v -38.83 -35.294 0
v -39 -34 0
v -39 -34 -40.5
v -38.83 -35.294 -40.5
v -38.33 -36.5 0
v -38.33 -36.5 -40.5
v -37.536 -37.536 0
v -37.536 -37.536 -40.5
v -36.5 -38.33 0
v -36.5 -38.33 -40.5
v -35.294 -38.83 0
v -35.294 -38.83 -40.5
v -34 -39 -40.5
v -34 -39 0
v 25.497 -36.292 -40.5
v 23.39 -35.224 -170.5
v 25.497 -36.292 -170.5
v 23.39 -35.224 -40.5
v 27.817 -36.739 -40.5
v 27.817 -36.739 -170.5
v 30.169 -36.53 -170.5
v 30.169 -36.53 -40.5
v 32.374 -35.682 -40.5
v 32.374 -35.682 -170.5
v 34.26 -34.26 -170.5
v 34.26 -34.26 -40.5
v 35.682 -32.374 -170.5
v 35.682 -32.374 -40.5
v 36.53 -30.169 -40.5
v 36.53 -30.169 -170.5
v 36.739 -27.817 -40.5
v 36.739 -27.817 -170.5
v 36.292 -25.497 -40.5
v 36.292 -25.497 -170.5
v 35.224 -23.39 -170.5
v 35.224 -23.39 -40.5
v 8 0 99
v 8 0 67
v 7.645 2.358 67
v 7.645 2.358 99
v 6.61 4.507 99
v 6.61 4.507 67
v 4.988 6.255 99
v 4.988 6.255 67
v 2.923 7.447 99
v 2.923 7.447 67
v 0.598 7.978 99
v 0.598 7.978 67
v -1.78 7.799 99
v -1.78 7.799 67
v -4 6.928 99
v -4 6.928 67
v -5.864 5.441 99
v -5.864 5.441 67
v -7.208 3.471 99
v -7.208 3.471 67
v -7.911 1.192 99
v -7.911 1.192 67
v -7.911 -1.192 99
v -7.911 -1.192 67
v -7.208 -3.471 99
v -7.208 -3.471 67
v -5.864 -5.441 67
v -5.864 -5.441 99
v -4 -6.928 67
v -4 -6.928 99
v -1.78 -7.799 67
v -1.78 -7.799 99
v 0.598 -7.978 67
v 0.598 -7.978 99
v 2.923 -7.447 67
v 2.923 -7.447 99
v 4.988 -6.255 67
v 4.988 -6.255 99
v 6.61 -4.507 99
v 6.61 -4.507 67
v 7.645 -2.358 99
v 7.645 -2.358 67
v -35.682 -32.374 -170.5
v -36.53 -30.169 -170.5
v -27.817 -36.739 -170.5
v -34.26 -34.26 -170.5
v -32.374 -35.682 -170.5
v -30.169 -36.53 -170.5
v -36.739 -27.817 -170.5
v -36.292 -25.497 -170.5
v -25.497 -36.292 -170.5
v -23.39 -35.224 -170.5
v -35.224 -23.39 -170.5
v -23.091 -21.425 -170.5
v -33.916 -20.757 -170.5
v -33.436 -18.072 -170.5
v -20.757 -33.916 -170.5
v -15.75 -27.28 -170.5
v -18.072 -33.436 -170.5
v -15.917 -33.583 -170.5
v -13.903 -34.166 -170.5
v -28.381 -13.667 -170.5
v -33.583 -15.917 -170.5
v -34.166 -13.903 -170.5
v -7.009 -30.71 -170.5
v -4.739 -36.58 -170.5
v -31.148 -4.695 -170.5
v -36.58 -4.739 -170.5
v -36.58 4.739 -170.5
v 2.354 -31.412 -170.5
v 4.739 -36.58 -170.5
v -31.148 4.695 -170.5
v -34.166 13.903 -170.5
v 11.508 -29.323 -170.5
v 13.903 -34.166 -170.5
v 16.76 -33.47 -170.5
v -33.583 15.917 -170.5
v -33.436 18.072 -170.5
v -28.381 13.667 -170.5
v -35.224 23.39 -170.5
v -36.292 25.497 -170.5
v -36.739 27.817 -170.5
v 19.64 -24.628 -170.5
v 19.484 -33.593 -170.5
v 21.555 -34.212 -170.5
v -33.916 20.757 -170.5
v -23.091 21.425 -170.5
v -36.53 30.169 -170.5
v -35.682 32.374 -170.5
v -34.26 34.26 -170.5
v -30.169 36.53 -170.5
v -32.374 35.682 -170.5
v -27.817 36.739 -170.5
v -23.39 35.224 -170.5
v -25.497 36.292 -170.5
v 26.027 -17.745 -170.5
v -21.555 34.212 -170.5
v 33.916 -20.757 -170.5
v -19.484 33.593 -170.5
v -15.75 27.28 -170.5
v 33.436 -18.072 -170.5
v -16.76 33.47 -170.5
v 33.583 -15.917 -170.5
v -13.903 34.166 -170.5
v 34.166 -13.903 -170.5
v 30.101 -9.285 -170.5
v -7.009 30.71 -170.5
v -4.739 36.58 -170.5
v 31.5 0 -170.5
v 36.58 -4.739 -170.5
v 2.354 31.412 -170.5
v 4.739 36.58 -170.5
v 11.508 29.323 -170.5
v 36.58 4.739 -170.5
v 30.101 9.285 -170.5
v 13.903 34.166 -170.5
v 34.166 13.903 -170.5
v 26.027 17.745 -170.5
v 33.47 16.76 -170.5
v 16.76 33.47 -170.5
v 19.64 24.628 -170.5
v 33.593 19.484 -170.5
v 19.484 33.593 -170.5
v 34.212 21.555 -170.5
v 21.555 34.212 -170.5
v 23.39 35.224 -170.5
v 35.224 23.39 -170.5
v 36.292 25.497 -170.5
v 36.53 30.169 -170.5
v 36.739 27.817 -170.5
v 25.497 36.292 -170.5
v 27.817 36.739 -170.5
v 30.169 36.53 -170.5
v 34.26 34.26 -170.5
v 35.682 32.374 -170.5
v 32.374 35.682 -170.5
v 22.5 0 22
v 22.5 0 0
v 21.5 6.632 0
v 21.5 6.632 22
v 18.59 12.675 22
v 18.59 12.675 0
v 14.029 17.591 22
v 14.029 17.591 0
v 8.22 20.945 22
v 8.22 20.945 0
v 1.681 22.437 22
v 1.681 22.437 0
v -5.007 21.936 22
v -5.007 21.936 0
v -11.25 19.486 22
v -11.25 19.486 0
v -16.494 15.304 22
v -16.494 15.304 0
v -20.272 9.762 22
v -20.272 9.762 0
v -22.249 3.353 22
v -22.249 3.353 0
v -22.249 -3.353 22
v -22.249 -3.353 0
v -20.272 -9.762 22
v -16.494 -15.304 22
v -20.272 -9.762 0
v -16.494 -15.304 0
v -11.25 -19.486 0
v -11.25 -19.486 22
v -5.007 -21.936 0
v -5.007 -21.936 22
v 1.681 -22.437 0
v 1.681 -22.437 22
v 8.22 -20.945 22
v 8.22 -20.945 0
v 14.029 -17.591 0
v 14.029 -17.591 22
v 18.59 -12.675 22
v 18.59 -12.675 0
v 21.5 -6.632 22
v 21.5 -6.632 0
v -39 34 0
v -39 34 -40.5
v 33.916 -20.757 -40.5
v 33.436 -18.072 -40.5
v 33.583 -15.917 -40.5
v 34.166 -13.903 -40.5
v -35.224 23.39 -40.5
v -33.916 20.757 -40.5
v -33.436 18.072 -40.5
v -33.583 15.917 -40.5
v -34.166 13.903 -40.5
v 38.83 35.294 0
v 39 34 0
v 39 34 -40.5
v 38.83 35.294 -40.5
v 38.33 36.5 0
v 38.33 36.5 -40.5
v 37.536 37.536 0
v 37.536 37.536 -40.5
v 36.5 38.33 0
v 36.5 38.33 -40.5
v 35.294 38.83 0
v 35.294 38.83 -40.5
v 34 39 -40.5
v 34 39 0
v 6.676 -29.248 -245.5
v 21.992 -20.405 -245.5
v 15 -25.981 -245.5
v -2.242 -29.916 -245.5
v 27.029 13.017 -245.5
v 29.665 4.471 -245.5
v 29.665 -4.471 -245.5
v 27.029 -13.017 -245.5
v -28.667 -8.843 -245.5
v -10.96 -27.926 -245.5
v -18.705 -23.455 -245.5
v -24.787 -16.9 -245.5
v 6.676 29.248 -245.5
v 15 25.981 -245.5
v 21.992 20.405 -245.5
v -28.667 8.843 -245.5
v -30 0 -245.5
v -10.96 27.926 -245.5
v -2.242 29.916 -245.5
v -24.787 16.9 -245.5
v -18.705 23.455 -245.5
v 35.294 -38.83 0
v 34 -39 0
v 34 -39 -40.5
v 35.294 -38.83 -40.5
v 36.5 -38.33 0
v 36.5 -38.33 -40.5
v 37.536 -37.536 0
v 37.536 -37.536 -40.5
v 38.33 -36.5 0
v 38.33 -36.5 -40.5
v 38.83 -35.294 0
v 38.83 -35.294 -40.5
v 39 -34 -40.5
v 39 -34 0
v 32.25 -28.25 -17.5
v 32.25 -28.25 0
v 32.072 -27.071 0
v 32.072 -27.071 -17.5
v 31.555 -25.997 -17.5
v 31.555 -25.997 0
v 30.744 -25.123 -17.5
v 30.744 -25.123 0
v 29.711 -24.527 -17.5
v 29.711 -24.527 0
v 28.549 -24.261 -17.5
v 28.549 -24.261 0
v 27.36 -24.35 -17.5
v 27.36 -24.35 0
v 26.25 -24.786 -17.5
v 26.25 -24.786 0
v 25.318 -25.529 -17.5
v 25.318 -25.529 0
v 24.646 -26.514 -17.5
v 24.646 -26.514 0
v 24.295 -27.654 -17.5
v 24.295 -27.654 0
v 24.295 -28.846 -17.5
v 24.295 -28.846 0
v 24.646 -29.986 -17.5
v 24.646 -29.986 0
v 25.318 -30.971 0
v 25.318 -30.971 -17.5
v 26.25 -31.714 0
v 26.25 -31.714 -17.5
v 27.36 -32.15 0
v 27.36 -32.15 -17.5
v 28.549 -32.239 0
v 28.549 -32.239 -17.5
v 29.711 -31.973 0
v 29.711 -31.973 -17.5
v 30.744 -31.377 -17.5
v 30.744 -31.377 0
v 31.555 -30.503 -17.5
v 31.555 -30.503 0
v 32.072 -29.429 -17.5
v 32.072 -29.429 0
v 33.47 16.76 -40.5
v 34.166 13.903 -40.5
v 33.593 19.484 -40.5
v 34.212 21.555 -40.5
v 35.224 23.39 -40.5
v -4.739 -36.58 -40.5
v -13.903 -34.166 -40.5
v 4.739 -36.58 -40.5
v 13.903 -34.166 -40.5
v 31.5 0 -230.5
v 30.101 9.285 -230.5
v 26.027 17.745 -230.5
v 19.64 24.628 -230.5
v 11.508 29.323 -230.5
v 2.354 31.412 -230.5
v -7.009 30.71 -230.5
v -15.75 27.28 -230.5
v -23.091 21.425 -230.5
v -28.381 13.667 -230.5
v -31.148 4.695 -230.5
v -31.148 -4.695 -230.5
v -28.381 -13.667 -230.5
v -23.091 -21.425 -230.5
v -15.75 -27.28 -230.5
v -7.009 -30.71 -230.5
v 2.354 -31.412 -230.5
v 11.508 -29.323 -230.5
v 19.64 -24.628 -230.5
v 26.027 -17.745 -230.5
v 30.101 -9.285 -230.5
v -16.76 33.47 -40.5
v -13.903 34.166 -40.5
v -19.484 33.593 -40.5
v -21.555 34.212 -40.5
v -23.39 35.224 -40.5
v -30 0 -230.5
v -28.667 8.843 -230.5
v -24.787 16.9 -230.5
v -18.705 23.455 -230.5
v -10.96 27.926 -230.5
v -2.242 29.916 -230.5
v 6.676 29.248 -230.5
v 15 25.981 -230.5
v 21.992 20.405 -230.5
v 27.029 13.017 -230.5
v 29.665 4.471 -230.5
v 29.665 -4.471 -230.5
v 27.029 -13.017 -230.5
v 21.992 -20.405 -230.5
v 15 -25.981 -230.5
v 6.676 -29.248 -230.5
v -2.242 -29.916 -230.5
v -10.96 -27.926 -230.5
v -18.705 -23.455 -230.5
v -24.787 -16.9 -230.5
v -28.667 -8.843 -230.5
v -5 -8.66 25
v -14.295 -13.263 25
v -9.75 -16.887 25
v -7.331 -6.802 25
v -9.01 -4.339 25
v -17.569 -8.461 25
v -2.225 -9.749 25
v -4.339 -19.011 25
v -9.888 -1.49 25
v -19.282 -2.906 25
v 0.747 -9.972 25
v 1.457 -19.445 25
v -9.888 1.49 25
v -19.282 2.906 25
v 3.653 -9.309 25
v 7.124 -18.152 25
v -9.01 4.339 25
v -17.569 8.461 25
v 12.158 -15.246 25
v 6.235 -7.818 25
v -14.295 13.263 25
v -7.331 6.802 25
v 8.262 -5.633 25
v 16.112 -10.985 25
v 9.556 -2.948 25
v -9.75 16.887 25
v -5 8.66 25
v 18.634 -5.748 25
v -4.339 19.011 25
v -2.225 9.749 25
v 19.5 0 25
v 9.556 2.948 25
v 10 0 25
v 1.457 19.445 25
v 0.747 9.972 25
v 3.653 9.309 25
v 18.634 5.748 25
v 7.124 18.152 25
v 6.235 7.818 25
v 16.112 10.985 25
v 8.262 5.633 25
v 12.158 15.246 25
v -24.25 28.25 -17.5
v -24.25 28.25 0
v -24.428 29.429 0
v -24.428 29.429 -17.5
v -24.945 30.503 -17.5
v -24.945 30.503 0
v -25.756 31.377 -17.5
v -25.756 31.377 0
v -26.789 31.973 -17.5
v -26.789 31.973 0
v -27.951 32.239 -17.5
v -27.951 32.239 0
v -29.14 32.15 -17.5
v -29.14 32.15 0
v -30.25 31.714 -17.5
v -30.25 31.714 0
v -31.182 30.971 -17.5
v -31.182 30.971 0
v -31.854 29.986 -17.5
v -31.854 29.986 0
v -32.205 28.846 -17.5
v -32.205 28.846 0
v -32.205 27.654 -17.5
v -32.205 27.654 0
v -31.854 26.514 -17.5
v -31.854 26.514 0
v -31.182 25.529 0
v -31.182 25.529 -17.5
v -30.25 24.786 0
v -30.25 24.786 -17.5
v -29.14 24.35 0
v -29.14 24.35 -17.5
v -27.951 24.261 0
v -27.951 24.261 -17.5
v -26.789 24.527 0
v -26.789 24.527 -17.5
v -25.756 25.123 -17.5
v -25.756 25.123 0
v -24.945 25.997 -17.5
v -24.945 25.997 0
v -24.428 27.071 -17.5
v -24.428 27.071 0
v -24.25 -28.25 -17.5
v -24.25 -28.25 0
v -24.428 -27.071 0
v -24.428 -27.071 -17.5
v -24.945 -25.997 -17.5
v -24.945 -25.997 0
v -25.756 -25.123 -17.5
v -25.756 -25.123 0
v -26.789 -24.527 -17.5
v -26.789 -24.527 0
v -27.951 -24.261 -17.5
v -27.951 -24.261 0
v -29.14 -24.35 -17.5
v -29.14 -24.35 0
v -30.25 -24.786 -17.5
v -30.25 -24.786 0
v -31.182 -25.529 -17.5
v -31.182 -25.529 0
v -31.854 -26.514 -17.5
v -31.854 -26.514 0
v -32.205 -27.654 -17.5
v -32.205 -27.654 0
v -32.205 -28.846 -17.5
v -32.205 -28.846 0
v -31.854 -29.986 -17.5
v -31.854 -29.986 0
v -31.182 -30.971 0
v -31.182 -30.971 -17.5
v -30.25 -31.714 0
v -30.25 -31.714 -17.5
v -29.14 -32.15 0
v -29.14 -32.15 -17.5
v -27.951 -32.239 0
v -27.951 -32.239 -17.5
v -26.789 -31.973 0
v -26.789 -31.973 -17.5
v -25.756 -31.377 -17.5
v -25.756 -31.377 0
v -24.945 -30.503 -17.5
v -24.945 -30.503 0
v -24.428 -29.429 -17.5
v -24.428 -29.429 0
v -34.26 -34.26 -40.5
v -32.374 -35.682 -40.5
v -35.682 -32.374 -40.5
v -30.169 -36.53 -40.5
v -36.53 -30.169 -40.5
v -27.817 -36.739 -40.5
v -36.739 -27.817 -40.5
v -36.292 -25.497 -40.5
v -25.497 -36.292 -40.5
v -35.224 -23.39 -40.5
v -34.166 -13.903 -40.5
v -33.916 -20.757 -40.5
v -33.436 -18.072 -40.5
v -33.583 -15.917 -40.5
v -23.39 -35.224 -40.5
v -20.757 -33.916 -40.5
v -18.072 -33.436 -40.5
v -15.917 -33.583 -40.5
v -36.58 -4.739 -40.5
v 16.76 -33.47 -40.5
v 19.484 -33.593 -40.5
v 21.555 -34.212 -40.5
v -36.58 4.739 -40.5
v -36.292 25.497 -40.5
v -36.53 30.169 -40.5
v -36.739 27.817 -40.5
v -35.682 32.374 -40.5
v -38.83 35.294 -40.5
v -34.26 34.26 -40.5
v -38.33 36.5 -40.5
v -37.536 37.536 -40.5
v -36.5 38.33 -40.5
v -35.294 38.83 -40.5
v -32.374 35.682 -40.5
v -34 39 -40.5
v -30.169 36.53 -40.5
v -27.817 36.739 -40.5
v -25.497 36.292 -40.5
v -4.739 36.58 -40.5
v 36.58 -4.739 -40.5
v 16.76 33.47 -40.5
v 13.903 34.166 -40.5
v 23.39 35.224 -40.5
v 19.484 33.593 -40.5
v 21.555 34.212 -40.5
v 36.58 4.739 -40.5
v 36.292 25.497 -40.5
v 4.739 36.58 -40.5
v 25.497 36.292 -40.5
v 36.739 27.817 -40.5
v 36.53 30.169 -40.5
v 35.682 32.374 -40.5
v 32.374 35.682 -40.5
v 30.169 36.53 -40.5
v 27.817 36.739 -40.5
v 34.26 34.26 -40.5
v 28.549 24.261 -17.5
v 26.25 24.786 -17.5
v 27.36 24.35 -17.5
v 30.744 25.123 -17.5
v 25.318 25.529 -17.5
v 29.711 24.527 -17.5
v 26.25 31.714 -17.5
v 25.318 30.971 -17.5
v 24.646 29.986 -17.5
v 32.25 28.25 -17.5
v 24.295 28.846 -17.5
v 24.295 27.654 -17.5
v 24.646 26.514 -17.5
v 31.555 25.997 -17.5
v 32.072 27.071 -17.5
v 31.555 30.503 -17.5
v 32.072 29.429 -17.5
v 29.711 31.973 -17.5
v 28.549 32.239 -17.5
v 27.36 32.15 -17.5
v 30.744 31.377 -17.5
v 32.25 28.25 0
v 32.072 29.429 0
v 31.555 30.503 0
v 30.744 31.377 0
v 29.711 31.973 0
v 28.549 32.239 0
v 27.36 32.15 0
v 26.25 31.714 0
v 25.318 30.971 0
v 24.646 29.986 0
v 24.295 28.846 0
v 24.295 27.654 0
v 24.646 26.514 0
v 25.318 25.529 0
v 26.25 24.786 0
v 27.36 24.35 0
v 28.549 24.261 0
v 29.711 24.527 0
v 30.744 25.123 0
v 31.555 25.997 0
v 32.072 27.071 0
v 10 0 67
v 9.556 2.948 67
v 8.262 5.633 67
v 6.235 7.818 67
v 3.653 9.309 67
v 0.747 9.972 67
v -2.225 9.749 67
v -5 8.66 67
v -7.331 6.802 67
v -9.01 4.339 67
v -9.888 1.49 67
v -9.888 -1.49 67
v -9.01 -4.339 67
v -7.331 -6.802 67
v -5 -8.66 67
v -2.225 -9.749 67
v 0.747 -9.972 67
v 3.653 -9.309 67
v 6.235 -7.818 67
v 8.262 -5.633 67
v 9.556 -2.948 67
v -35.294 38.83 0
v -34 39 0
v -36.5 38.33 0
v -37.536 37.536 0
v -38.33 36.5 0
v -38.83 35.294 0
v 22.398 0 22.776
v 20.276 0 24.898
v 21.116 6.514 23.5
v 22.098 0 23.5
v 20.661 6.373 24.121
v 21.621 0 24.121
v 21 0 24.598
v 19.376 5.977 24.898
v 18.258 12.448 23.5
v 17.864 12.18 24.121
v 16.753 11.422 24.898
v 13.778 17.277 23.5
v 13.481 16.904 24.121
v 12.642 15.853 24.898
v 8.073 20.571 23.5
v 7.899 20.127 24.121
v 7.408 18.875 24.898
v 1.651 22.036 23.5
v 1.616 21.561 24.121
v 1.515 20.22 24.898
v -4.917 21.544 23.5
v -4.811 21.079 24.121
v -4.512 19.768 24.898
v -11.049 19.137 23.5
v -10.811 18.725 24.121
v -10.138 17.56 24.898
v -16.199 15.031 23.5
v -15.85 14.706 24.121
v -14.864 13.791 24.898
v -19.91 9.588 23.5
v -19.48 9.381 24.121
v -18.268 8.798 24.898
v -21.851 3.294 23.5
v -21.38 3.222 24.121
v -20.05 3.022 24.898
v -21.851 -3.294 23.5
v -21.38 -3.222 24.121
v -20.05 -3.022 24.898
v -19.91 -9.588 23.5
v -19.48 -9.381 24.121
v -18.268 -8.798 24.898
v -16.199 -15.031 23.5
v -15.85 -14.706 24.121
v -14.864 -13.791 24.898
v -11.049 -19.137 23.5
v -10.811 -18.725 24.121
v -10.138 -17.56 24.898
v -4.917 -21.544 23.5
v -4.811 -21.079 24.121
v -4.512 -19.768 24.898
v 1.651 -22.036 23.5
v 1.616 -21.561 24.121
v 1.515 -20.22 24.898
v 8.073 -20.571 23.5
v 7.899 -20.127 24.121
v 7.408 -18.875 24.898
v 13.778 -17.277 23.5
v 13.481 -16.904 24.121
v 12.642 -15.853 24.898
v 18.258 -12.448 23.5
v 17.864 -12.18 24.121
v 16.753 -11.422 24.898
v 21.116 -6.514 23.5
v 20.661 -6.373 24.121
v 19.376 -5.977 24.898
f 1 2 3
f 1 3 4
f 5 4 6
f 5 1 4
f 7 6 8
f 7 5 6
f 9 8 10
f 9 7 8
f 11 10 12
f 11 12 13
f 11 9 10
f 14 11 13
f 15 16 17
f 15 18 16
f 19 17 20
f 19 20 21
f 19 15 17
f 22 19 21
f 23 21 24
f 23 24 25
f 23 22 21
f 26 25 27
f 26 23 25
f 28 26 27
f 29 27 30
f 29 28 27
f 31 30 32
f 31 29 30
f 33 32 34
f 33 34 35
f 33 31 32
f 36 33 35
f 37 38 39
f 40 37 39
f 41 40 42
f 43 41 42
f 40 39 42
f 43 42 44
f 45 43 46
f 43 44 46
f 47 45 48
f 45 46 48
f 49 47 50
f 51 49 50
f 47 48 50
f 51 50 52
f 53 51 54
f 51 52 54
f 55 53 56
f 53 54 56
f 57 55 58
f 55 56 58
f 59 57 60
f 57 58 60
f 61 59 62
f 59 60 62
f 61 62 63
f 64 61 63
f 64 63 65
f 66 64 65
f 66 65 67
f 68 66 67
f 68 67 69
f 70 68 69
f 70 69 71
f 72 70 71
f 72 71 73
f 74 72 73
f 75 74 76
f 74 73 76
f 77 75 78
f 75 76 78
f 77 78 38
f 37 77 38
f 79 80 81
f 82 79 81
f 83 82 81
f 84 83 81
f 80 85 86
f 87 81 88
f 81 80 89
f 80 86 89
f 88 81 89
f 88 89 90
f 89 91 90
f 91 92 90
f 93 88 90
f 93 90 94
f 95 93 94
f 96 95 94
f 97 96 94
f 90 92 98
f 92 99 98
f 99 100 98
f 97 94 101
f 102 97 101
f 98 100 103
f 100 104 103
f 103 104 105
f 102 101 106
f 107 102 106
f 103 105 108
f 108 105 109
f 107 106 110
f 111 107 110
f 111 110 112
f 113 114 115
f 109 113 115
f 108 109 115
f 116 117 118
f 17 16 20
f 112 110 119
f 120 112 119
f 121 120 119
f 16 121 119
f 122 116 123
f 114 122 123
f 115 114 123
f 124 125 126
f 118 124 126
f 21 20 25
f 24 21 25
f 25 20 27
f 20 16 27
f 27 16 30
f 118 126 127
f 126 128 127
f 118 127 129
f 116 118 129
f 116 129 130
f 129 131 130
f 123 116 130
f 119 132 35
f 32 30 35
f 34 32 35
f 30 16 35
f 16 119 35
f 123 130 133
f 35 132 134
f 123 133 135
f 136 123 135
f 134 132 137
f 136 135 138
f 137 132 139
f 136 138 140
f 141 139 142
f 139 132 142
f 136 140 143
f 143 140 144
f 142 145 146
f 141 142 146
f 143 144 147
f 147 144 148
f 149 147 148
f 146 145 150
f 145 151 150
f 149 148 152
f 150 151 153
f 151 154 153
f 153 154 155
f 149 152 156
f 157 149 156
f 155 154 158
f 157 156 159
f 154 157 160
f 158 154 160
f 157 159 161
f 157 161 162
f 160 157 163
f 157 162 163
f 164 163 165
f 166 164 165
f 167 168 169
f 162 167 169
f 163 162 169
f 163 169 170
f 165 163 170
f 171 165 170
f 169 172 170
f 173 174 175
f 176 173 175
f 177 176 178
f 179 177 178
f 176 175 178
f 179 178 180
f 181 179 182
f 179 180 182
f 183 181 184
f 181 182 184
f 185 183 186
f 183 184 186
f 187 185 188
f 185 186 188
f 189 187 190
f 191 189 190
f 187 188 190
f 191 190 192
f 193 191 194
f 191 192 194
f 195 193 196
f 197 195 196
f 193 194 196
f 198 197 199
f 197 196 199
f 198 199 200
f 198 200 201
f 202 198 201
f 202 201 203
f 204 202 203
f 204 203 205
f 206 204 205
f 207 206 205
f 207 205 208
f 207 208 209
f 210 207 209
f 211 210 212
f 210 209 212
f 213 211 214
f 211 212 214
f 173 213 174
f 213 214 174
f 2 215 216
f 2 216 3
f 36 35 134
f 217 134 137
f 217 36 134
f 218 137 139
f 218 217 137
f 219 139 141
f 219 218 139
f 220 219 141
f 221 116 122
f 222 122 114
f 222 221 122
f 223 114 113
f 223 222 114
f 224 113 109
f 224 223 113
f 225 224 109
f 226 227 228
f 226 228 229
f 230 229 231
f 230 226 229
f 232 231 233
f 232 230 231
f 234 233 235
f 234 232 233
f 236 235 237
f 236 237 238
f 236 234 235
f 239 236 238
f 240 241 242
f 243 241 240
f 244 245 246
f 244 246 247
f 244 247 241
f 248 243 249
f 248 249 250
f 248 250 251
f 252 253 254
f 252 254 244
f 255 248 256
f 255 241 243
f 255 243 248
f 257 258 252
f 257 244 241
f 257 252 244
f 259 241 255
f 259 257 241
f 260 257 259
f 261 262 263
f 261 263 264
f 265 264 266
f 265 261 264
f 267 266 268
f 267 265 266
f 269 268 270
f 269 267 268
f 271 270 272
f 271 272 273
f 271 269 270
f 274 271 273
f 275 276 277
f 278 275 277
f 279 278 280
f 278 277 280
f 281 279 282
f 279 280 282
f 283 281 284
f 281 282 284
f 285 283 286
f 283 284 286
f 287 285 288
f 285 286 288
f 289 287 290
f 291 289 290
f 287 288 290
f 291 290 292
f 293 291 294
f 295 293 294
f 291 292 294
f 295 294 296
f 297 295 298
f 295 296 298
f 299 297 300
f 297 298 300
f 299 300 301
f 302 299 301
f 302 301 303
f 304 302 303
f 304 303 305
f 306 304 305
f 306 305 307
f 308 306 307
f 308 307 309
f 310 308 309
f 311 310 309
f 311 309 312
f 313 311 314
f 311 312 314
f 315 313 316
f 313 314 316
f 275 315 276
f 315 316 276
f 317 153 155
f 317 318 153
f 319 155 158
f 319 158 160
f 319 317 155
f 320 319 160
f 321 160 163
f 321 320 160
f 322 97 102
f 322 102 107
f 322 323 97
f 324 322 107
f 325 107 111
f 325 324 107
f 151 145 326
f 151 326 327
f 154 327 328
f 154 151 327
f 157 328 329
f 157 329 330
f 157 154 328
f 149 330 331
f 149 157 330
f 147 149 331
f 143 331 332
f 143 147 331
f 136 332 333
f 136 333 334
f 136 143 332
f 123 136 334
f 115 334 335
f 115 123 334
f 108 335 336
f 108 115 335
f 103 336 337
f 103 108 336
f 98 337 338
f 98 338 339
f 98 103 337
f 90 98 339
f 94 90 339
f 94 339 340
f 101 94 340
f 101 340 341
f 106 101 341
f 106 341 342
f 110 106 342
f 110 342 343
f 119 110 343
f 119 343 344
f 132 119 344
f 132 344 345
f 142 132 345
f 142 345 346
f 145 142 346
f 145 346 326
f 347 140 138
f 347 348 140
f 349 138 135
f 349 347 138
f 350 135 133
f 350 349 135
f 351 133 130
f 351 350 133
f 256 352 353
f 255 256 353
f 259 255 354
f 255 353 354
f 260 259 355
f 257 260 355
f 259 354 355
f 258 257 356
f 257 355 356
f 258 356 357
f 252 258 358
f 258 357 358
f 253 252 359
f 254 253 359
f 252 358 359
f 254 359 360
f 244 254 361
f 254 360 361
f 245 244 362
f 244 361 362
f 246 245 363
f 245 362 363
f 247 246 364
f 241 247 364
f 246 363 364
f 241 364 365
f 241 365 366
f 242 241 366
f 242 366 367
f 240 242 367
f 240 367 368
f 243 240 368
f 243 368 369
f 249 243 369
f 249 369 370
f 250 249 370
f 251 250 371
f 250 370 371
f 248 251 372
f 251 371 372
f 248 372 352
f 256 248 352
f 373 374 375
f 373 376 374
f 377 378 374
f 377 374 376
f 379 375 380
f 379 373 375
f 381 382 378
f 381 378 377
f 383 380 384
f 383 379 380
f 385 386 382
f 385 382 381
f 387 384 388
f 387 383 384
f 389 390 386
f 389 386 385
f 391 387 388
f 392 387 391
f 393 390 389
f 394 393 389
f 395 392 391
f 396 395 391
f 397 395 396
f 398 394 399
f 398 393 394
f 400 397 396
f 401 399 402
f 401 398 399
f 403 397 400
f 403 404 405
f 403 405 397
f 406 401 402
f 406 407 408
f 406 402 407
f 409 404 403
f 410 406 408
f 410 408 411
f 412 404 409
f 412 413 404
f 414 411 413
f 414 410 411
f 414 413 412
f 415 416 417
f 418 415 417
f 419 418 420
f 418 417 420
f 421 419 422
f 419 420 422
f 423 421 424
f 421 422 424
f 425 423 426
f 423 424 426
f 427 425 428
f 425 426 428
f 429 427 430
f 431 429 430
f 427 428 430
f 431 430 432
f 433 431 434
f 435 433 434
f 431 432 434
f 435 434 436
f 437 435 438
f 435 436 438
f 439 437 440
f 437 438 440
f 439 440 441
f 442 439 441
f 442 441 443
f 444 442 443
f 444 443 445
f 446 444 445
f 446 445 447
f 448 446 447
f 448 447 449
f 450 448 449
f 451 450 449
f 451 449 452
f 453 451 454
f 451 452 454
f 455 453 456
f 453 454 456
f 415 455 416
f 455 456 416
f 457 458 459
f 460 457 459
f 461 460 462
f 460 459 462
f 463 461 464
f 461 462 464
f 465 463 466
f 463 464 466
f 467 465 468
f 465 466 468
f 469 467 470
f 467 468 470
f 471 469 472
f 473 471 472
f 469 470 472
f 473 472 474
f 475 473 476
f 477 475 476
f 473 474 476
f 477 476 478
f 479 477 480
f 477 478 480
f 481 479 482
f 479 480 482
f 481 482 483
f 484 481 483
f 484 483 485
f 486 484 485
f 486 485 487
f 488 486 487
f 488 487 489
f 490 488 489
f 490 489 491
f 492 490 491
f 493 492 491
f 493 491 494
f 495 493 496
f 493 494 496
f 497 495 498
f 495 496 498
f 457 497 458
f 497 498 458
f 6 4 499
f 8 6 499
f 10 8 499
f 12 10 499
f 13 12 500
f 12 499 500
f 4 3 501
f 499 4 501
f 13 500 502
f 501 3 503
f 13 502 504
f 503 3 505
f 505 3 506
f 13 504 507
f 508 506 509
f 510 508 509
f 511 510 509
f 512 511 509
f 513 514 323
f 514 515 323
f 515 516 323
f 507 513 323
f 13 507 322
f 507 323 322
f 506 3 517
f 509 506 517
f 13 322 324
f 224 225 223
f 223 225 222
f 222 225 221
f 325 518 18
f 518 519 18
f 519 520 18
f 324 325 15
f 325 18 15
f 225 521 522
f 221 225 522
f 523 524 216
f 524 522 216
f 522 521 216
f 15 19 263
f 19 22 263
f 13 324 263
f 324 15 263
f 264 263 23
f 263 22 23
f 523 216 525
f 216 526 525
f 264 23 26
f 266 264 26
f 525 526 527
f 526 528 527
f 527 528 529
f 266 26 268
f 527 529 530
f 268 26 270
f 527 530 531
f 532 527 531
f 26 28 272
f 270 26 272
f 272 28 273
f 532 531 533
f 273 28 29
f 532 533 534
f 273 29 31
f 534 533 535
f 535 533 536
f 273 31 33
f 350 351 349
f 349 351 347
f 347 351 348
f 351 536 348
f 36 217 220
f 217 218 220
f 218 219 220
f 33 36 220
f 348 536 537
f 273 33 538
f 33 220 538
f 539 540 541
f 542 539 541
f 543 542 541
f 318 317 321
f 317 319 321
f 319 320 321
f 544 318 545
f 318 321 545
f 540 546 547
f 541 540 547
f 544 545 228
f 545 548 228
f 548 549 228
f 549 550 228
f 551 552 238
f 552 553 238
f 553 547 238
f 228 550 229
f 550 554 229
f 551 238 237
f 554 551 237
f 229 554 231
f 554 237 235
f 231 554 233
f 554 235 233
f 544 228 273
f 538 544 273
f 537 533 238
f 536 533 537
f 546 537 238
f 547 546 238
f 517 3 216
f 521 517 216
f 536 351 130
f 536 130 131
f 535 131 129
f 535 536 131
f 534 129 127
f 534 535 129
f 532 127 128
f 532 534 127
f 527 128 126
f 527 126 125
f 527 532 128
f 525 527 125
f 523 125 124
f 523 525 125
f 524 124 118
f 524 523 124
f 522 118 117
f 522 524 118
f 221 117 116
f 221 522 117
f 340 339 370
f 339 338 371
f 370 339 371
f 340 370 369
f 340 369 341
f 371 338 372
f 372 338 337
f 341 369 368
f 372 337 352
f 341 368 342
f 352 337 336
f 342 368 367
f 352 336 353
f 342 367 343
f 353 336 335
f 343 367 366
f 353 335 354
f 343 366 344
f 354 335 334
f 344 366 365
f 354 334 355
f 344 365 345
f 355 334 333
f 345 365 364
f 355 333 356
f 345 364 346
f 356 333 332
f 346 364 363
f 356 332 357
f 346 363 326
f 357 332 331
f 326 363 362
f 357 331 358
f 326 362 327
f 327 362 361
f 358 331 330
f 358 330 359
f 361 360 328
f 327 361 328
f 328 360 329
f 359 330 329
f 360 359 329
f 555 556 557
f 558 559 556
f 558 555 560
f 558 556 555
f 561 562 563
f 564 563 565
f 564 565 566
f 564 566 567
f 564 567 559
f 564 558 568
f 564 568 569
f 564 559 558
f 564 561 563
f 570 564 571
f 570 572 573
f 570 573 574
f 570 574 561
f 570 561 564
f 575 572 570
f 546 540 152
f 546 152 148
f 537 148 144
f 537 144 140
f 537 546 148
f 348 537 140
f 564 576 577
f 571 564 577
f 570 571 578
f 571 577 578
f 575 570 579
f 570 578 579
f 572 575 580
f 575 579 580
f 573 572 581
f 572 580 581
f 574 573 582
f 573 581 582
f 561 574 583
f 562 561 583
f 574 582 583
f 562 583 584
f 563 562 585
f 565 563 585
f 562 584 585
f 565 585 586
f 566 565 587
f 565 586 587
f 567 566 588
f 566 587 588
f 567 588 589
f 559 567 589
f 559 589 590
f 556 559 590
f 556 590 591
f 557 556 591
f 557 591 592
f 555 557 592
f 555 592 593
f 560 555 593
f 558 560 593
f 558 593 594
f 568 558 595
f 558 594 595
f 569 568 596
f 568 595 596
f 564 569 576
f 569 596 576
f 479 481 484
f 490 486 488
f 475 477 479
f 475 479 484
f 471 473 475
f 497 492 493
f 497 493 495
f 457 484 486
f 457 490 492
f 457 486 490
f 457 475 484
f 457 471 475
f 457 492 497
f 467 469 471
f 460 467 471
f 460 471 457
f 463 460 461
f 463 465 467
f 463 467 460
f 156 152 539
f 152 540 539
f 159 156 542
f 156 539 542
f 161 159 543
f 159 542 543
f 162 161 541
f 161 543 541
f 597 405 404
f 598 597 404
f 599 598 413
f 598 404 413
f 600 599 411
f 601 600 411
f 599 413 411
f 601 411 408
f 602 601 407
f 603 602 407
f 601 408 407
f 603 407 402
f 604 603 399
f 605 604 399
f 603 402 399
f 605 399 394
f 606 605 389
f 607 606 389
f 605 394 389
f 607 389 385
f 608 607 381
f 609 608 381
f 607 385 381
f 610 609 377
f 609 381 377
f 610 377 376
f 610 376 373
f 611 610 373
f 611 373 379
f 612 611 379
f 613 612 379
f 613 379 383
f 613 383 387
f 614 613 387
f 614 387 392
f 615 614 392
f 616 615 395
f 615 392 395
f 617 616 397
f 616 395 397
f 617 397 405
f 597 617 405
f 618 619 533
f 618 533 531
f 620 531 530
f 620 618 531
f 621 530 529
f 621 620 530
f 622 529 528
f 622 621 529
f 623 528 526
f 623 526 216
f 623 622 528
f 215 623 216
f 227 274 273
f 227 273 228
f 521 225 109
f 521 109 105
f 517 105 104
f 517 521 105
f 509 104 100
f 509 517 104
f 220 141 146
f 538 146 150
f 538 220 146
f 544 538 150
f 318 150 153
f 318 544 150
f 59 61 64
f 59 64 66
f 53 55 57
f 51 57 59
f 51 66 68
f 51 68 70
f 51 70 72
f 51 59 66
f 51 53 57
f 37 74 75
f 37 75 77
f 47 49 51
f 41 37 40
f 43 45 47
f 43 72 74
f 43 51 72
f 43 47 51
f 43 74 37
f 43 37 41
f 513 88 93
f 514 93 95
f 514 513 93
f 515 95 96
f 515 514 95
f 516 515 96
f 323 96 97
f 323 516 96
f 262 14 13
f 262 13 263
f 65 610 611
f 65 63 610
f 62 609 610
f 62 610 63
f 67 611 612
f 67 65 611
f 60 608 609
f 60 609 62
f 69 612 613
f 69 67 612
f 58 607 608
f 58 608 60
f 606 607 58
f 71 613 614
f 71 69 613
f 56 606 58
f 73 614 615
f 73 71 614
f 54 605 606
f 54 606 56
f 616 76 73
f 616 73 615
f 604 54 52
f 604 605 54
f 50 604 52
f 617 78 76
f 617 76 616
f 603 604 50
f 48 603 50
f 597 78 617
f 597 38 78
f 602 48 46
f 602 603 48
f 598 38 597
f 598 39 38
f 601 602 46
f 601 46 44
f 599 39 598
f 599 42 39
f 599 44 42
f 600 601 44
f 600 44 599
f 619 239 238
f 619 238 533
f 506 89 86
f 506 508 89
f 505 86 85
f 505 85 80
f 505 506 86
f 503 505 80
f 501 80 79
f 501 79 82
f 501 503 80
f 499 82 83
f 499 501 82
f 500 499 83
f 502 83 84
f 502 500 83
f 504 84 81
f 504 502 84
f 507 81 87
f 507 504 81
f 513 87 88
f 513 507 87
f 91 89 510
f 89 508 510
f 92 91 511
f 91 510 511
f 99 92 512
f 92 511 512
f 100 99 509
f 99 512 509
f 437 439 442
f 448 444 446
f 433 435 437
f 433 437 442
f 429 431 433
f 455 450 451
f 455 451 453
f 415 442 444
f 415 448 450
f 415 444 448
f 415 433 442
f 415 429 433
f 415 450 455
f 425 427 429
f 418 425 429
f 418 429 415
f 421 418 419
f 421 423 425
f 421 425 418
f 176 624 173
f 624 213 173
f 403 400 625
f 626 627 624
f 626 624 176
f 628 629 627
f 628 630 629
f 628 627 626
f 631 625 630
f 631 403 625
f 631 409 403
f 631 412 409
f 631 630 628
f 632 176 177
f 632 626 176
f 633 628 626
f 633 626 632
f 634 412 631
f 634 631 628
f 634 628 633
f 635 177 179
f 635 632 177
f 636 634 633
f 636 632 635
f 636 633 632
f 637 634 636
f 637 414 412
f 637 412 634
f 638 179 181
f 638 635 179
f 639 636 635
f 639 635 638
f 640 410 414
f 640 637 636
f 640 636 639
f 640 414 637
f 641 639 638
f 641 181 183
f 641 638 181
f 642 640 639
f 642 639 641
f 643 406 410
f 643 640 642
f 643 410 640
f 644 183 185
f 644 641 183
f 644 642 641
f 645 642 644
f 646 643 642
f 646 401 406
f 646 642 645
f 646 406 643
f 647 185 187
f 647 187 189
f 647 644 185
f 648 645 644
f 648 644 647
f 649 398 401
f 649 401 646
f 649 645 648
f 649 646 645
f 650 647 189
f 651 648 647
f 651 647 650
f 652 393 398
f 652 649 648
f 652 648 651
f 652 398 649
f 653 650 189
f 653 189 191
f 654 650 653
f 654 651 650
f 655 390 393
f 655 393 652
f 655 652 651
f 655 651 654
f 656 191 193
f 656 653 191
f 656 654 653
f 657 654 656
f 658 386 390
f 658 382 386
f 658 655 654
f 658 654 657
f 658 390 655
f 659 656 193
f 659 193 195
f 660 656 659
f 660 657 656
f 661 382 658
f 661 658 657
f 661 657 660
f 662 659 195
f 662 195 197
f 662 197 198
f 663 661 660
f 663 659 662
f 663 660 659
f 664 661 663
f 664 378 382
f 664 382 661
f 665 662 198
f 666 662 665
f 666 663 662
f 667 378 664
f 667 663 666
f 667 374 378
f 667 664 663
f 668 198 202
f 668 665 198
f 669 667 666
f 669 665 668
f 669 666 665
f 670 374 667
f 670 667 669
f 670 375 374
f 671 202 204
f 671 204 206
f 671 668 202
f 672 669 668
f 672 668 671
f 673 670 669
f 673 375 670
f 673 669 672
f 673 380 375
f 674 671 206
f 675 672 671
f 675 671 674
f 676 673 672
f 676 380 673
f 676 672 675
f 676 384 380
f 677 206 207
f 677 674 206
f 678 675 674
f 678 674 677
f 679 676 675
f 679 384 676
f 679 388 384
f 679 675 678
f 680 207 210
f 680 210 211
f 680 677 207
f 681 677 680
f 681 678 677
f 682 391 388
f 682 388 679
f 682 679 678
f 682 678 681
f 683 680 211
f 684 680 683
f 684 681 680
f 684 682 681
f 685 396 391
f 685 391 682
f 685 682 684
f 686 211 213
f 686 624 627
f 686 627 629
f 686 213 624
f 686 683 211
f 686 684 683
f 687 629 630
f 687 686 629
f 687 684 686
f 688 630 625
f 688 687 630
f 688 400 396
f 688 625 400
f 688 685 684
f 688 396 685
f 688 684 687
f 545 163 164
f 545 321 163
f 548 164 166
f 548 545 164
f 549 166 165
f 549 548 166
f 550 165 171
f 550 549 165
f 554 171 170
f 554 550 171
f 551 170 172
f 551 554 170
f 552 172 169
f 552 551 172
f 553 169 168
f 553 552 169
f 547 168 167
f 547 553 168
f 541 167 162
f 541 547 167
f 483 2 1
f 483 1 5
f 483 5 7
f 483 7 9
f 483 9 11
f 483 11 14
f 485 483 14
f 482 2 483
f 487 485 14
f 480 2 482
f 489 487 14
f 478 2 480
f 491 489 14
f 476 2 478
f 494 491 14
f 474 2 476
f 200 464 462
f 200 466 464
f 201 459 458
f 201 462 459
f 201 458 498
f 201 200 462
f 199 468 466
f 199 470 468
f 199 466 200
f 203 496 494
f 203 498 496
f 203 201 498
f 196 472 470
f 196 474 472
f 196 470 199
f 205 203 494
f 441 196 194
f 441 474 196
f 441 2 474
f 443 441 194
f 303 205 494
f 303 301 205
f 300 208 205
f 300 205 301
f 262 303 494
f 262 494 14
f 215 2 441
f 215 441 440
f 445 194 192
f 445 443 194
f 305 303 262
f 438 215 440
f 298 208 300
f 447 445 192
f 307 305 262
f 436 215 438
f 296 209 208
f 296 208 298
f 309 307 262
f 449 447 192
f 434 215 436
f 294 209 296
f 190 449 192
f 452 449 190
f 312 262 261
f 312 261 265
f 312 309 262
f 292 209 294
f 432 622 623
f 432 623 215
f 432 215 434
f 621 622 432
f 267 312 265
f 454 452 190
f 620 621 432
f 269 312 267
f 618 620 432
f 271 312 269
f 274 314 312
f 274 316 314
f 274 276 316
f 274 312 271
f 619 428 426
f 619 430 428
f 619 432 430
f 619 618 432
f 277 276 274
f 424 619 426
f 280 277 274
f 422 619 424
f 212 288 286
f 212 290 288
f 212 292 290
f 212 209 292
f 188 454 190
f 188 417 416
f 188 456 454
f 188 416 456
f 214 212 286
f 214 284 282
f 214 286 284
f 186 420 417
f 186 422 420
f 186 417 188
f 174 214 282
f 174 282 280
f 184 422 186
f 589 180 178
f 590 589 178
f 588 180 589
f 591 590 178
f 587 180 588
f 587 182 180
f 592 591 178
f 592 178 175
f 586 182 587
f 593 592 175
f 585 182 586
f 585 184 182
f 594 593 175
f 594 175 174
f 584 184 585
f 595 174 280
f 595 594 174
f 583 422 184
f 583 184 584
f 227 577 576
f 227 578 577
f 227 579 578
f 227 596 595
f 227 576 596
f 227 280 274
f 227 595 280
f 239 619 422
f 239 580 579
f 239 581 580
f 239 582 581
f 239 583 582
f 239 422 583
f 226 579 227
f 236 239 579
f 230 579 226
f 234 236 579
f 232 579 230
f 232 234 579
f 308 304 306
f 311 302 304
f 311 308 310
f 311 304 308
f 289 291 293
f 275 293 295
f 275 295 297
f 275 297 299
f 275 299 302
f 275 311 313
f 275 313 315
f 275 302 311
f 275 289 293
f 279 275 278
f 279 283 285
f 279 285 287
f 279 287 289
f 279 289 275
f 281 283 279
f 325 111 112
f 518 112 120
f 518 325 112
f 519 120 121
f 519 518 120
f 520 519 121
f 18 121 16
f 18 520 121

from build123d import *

# Parameters (mm, degrees)
SALIENTE_EXTRUIR1_DEPTH = 40.5
CROQUIS2_R              = 36.886156795
SALIENTE_EXTRUIR2_DEPTH = 170.5
CROQUIS3_R              = 31.5
SALIENTE_EXTRUIR3_DEPTH = 230.5
CROQUIS4_R              = 30
SALIENTE_EXTRUIR4_DEPTH = 15
CROQUIS5_R              = 8.5
SALIENTE_EXTRUIR5_DEPTH = 170.5
REDONDEO2_R             = 10
REDONDEO3_R             = 10
REDONDEO4_R             = 10
REDONDEO5_R             = 10
CROQUIS6_R              = 4
CORTAR_EXTRUIR1_DEPTH   = 17.5
CROQUIS7_R              = 22.5
SALIENTE_EXTRUIR7_DEPTH = 25
REDONDEO6_R             = 3
CROQUIS8_R              = 10
SALIENTE_EXTRUIR8_DEPTH = 42
CROQUIS9_R              = 8
SALIENTE_EXTRUIR9_DEPTH = 32


with BuildPart() as part:
    # Croquis1 → Saliente-Extruir1 (new body)
    with BuildSketch(Plane.XY):
        with BuildLine():
            Line((-34, -39), (34, -39))
            ThreePointArc((34, -39), (37.535533906, -37.535533906), (39, -34))
            Line((39, -34), (39, 34))
            ThreePointArc((39, 34), (37.535533906, 37.535533906), (34, 39))
            Line((34, 39), (-34, 39))
            ThreePointArc((-34, 39), (-37.535533906, 37.535533906), (-39, 34))
            Line((-39, 34), (-39, -34))
            ThreePointArc((-39, -34), (-37.535533906, -37.535533906), (-34, -39))
        make_face()
    extrude(amount=-SALIENTE_EXTRUIR1_DEPTH)

    # Croquis2 → Saliente-Extruir2 (add)
    with BuildSketch(Plane.XY):
        Circle(CROQUIS2_R)
    extrude(amount=-SALIENTE_EXTRUIR2_DEPTH)

    # Croquis3 → Saliente-Extruir3 (add)
    with BuildSketch(Plane.XY):
        Circle(CROQUIS3_R)
    extrude(amount=-SALIENTE_EXTRUIR3_DEPTH)

    # Croquis4 → Saliente-Extruir4 (add)
    with BuildSketch(Plane(origin=(0, 0, -230.5), x_dir=(-1, 0, 0), z_dir=(0, 0, -1))):
        Circle(CROQUIS4_R)
    extrude(amount=SALIENTE_EXTRUIR4_DEPTH)

    # Croquis5 → Saliente-Extruir5 (add)
    with BuildSketch(Plane.XY):
        with Locations((28.25, 28.25)):
            Circle(CROQUIS5_R)
        with Locations((28.25, -28.25)):
            Circle(CROQUIS5_R)
        with Locations((-28.25, -28.25)):
            Circle(CROQUIS5_R)
        with Locations((-28.25, 28.25)):
            Circle(CROQUIS5_R)
    extrude(amount=-SALIENTE_EXTRUIR5_DEPTH)

    # Redondeo2
    redondeo2_edges = [part.edges().sort_by_distance(p)[0] for p in [
        (20.168422903, 30.884029541, -105.5),
        (-20.168422903, 30.884029541, -105.5),
    ]]
    fillet(redondeo2_edges, radius=REDONDEO2_R)

    # Redondeo3
    redondeo3_edges = [part.edges().sort_by_distance(p)[0] for p in [
        (-30.884029541, -20.168422903, -105.5),
        (-30.884029541, 20.168422903, -105.5),
    ]]
    fillet(redondeo3_edges, radius=REDONDEO3_R)

    # Redondeo4
    redondeo4_edges = [part.edges().sort_by_distance(p)[0] for p in [
        (20.168422903, -30.884029541, -105.5),
        (-20.168422903, -30.884029541, -105.5),
    ]]
    fillet(redondeo4_edges, radius=REDONDEO4_R)

    # Redondeo5
    redondeo5_edges = [part.edges().sort_by_distance(p)[0] for p in [
        (30.884029541, 20.168422903, -105.5),
        (30.884029541, -20.168422903, -105.5),
    ]]
    fillet(redondeo5_edges, radius=REDONDEO5_R)

    # Croquis6 → Cortar-Extruir1 (cut)
    with BuildSketch(Plane.XY):
        with Locations((28.25, 28.25)):
            Circle(CROQUIS6_R)
        with Locations((-28.25, 28.25)):
            Circle(CROQUIS6_R)
        with Locations((28.25, -28.25)):
            Circle(CROQUIS6_R)
        with Locations((-28.25, -28.25)):
            Circle(CROQUIS6_R)
    extrude(amount=-CORTAR_EXTRUIR1_DEPTH, mode=Mode.SUBTRACT)

    # Croquis7 → Saliente-Extruir7 (add)
    with BuildSketch(Plane.XY):
        Circle(CROQUIS7_R)
    extrude(amount=SALIENTE_EXTRUIR7_DEPTH)

    # Redondeo6
    redondeo6_edges = [part.edges().sort_by_distance(p)[0] for p in [
        (-22.5, 0, 25),
    ]]
    fillet(redondeo6_edges, radius=REDONDEO6_R)

    # Croquis8 → Saliente-Extruir8 (add)
    with BuildSketch(Plane.XY.offset(25)):
        Circle(CROQUIS8_R)
    extrude(amount=SALIENTE_EXTRUIR8_DEPTH)

    # Croquis9 → Saliente-Extruir9 (add)
    with BuildSketch(Plane.XY.offset(67)):
        Circle(CROQUIS9_R)
    extrude(amount=SALIENTE_EXTRUIR9_DEPTH)


solid = part.part
